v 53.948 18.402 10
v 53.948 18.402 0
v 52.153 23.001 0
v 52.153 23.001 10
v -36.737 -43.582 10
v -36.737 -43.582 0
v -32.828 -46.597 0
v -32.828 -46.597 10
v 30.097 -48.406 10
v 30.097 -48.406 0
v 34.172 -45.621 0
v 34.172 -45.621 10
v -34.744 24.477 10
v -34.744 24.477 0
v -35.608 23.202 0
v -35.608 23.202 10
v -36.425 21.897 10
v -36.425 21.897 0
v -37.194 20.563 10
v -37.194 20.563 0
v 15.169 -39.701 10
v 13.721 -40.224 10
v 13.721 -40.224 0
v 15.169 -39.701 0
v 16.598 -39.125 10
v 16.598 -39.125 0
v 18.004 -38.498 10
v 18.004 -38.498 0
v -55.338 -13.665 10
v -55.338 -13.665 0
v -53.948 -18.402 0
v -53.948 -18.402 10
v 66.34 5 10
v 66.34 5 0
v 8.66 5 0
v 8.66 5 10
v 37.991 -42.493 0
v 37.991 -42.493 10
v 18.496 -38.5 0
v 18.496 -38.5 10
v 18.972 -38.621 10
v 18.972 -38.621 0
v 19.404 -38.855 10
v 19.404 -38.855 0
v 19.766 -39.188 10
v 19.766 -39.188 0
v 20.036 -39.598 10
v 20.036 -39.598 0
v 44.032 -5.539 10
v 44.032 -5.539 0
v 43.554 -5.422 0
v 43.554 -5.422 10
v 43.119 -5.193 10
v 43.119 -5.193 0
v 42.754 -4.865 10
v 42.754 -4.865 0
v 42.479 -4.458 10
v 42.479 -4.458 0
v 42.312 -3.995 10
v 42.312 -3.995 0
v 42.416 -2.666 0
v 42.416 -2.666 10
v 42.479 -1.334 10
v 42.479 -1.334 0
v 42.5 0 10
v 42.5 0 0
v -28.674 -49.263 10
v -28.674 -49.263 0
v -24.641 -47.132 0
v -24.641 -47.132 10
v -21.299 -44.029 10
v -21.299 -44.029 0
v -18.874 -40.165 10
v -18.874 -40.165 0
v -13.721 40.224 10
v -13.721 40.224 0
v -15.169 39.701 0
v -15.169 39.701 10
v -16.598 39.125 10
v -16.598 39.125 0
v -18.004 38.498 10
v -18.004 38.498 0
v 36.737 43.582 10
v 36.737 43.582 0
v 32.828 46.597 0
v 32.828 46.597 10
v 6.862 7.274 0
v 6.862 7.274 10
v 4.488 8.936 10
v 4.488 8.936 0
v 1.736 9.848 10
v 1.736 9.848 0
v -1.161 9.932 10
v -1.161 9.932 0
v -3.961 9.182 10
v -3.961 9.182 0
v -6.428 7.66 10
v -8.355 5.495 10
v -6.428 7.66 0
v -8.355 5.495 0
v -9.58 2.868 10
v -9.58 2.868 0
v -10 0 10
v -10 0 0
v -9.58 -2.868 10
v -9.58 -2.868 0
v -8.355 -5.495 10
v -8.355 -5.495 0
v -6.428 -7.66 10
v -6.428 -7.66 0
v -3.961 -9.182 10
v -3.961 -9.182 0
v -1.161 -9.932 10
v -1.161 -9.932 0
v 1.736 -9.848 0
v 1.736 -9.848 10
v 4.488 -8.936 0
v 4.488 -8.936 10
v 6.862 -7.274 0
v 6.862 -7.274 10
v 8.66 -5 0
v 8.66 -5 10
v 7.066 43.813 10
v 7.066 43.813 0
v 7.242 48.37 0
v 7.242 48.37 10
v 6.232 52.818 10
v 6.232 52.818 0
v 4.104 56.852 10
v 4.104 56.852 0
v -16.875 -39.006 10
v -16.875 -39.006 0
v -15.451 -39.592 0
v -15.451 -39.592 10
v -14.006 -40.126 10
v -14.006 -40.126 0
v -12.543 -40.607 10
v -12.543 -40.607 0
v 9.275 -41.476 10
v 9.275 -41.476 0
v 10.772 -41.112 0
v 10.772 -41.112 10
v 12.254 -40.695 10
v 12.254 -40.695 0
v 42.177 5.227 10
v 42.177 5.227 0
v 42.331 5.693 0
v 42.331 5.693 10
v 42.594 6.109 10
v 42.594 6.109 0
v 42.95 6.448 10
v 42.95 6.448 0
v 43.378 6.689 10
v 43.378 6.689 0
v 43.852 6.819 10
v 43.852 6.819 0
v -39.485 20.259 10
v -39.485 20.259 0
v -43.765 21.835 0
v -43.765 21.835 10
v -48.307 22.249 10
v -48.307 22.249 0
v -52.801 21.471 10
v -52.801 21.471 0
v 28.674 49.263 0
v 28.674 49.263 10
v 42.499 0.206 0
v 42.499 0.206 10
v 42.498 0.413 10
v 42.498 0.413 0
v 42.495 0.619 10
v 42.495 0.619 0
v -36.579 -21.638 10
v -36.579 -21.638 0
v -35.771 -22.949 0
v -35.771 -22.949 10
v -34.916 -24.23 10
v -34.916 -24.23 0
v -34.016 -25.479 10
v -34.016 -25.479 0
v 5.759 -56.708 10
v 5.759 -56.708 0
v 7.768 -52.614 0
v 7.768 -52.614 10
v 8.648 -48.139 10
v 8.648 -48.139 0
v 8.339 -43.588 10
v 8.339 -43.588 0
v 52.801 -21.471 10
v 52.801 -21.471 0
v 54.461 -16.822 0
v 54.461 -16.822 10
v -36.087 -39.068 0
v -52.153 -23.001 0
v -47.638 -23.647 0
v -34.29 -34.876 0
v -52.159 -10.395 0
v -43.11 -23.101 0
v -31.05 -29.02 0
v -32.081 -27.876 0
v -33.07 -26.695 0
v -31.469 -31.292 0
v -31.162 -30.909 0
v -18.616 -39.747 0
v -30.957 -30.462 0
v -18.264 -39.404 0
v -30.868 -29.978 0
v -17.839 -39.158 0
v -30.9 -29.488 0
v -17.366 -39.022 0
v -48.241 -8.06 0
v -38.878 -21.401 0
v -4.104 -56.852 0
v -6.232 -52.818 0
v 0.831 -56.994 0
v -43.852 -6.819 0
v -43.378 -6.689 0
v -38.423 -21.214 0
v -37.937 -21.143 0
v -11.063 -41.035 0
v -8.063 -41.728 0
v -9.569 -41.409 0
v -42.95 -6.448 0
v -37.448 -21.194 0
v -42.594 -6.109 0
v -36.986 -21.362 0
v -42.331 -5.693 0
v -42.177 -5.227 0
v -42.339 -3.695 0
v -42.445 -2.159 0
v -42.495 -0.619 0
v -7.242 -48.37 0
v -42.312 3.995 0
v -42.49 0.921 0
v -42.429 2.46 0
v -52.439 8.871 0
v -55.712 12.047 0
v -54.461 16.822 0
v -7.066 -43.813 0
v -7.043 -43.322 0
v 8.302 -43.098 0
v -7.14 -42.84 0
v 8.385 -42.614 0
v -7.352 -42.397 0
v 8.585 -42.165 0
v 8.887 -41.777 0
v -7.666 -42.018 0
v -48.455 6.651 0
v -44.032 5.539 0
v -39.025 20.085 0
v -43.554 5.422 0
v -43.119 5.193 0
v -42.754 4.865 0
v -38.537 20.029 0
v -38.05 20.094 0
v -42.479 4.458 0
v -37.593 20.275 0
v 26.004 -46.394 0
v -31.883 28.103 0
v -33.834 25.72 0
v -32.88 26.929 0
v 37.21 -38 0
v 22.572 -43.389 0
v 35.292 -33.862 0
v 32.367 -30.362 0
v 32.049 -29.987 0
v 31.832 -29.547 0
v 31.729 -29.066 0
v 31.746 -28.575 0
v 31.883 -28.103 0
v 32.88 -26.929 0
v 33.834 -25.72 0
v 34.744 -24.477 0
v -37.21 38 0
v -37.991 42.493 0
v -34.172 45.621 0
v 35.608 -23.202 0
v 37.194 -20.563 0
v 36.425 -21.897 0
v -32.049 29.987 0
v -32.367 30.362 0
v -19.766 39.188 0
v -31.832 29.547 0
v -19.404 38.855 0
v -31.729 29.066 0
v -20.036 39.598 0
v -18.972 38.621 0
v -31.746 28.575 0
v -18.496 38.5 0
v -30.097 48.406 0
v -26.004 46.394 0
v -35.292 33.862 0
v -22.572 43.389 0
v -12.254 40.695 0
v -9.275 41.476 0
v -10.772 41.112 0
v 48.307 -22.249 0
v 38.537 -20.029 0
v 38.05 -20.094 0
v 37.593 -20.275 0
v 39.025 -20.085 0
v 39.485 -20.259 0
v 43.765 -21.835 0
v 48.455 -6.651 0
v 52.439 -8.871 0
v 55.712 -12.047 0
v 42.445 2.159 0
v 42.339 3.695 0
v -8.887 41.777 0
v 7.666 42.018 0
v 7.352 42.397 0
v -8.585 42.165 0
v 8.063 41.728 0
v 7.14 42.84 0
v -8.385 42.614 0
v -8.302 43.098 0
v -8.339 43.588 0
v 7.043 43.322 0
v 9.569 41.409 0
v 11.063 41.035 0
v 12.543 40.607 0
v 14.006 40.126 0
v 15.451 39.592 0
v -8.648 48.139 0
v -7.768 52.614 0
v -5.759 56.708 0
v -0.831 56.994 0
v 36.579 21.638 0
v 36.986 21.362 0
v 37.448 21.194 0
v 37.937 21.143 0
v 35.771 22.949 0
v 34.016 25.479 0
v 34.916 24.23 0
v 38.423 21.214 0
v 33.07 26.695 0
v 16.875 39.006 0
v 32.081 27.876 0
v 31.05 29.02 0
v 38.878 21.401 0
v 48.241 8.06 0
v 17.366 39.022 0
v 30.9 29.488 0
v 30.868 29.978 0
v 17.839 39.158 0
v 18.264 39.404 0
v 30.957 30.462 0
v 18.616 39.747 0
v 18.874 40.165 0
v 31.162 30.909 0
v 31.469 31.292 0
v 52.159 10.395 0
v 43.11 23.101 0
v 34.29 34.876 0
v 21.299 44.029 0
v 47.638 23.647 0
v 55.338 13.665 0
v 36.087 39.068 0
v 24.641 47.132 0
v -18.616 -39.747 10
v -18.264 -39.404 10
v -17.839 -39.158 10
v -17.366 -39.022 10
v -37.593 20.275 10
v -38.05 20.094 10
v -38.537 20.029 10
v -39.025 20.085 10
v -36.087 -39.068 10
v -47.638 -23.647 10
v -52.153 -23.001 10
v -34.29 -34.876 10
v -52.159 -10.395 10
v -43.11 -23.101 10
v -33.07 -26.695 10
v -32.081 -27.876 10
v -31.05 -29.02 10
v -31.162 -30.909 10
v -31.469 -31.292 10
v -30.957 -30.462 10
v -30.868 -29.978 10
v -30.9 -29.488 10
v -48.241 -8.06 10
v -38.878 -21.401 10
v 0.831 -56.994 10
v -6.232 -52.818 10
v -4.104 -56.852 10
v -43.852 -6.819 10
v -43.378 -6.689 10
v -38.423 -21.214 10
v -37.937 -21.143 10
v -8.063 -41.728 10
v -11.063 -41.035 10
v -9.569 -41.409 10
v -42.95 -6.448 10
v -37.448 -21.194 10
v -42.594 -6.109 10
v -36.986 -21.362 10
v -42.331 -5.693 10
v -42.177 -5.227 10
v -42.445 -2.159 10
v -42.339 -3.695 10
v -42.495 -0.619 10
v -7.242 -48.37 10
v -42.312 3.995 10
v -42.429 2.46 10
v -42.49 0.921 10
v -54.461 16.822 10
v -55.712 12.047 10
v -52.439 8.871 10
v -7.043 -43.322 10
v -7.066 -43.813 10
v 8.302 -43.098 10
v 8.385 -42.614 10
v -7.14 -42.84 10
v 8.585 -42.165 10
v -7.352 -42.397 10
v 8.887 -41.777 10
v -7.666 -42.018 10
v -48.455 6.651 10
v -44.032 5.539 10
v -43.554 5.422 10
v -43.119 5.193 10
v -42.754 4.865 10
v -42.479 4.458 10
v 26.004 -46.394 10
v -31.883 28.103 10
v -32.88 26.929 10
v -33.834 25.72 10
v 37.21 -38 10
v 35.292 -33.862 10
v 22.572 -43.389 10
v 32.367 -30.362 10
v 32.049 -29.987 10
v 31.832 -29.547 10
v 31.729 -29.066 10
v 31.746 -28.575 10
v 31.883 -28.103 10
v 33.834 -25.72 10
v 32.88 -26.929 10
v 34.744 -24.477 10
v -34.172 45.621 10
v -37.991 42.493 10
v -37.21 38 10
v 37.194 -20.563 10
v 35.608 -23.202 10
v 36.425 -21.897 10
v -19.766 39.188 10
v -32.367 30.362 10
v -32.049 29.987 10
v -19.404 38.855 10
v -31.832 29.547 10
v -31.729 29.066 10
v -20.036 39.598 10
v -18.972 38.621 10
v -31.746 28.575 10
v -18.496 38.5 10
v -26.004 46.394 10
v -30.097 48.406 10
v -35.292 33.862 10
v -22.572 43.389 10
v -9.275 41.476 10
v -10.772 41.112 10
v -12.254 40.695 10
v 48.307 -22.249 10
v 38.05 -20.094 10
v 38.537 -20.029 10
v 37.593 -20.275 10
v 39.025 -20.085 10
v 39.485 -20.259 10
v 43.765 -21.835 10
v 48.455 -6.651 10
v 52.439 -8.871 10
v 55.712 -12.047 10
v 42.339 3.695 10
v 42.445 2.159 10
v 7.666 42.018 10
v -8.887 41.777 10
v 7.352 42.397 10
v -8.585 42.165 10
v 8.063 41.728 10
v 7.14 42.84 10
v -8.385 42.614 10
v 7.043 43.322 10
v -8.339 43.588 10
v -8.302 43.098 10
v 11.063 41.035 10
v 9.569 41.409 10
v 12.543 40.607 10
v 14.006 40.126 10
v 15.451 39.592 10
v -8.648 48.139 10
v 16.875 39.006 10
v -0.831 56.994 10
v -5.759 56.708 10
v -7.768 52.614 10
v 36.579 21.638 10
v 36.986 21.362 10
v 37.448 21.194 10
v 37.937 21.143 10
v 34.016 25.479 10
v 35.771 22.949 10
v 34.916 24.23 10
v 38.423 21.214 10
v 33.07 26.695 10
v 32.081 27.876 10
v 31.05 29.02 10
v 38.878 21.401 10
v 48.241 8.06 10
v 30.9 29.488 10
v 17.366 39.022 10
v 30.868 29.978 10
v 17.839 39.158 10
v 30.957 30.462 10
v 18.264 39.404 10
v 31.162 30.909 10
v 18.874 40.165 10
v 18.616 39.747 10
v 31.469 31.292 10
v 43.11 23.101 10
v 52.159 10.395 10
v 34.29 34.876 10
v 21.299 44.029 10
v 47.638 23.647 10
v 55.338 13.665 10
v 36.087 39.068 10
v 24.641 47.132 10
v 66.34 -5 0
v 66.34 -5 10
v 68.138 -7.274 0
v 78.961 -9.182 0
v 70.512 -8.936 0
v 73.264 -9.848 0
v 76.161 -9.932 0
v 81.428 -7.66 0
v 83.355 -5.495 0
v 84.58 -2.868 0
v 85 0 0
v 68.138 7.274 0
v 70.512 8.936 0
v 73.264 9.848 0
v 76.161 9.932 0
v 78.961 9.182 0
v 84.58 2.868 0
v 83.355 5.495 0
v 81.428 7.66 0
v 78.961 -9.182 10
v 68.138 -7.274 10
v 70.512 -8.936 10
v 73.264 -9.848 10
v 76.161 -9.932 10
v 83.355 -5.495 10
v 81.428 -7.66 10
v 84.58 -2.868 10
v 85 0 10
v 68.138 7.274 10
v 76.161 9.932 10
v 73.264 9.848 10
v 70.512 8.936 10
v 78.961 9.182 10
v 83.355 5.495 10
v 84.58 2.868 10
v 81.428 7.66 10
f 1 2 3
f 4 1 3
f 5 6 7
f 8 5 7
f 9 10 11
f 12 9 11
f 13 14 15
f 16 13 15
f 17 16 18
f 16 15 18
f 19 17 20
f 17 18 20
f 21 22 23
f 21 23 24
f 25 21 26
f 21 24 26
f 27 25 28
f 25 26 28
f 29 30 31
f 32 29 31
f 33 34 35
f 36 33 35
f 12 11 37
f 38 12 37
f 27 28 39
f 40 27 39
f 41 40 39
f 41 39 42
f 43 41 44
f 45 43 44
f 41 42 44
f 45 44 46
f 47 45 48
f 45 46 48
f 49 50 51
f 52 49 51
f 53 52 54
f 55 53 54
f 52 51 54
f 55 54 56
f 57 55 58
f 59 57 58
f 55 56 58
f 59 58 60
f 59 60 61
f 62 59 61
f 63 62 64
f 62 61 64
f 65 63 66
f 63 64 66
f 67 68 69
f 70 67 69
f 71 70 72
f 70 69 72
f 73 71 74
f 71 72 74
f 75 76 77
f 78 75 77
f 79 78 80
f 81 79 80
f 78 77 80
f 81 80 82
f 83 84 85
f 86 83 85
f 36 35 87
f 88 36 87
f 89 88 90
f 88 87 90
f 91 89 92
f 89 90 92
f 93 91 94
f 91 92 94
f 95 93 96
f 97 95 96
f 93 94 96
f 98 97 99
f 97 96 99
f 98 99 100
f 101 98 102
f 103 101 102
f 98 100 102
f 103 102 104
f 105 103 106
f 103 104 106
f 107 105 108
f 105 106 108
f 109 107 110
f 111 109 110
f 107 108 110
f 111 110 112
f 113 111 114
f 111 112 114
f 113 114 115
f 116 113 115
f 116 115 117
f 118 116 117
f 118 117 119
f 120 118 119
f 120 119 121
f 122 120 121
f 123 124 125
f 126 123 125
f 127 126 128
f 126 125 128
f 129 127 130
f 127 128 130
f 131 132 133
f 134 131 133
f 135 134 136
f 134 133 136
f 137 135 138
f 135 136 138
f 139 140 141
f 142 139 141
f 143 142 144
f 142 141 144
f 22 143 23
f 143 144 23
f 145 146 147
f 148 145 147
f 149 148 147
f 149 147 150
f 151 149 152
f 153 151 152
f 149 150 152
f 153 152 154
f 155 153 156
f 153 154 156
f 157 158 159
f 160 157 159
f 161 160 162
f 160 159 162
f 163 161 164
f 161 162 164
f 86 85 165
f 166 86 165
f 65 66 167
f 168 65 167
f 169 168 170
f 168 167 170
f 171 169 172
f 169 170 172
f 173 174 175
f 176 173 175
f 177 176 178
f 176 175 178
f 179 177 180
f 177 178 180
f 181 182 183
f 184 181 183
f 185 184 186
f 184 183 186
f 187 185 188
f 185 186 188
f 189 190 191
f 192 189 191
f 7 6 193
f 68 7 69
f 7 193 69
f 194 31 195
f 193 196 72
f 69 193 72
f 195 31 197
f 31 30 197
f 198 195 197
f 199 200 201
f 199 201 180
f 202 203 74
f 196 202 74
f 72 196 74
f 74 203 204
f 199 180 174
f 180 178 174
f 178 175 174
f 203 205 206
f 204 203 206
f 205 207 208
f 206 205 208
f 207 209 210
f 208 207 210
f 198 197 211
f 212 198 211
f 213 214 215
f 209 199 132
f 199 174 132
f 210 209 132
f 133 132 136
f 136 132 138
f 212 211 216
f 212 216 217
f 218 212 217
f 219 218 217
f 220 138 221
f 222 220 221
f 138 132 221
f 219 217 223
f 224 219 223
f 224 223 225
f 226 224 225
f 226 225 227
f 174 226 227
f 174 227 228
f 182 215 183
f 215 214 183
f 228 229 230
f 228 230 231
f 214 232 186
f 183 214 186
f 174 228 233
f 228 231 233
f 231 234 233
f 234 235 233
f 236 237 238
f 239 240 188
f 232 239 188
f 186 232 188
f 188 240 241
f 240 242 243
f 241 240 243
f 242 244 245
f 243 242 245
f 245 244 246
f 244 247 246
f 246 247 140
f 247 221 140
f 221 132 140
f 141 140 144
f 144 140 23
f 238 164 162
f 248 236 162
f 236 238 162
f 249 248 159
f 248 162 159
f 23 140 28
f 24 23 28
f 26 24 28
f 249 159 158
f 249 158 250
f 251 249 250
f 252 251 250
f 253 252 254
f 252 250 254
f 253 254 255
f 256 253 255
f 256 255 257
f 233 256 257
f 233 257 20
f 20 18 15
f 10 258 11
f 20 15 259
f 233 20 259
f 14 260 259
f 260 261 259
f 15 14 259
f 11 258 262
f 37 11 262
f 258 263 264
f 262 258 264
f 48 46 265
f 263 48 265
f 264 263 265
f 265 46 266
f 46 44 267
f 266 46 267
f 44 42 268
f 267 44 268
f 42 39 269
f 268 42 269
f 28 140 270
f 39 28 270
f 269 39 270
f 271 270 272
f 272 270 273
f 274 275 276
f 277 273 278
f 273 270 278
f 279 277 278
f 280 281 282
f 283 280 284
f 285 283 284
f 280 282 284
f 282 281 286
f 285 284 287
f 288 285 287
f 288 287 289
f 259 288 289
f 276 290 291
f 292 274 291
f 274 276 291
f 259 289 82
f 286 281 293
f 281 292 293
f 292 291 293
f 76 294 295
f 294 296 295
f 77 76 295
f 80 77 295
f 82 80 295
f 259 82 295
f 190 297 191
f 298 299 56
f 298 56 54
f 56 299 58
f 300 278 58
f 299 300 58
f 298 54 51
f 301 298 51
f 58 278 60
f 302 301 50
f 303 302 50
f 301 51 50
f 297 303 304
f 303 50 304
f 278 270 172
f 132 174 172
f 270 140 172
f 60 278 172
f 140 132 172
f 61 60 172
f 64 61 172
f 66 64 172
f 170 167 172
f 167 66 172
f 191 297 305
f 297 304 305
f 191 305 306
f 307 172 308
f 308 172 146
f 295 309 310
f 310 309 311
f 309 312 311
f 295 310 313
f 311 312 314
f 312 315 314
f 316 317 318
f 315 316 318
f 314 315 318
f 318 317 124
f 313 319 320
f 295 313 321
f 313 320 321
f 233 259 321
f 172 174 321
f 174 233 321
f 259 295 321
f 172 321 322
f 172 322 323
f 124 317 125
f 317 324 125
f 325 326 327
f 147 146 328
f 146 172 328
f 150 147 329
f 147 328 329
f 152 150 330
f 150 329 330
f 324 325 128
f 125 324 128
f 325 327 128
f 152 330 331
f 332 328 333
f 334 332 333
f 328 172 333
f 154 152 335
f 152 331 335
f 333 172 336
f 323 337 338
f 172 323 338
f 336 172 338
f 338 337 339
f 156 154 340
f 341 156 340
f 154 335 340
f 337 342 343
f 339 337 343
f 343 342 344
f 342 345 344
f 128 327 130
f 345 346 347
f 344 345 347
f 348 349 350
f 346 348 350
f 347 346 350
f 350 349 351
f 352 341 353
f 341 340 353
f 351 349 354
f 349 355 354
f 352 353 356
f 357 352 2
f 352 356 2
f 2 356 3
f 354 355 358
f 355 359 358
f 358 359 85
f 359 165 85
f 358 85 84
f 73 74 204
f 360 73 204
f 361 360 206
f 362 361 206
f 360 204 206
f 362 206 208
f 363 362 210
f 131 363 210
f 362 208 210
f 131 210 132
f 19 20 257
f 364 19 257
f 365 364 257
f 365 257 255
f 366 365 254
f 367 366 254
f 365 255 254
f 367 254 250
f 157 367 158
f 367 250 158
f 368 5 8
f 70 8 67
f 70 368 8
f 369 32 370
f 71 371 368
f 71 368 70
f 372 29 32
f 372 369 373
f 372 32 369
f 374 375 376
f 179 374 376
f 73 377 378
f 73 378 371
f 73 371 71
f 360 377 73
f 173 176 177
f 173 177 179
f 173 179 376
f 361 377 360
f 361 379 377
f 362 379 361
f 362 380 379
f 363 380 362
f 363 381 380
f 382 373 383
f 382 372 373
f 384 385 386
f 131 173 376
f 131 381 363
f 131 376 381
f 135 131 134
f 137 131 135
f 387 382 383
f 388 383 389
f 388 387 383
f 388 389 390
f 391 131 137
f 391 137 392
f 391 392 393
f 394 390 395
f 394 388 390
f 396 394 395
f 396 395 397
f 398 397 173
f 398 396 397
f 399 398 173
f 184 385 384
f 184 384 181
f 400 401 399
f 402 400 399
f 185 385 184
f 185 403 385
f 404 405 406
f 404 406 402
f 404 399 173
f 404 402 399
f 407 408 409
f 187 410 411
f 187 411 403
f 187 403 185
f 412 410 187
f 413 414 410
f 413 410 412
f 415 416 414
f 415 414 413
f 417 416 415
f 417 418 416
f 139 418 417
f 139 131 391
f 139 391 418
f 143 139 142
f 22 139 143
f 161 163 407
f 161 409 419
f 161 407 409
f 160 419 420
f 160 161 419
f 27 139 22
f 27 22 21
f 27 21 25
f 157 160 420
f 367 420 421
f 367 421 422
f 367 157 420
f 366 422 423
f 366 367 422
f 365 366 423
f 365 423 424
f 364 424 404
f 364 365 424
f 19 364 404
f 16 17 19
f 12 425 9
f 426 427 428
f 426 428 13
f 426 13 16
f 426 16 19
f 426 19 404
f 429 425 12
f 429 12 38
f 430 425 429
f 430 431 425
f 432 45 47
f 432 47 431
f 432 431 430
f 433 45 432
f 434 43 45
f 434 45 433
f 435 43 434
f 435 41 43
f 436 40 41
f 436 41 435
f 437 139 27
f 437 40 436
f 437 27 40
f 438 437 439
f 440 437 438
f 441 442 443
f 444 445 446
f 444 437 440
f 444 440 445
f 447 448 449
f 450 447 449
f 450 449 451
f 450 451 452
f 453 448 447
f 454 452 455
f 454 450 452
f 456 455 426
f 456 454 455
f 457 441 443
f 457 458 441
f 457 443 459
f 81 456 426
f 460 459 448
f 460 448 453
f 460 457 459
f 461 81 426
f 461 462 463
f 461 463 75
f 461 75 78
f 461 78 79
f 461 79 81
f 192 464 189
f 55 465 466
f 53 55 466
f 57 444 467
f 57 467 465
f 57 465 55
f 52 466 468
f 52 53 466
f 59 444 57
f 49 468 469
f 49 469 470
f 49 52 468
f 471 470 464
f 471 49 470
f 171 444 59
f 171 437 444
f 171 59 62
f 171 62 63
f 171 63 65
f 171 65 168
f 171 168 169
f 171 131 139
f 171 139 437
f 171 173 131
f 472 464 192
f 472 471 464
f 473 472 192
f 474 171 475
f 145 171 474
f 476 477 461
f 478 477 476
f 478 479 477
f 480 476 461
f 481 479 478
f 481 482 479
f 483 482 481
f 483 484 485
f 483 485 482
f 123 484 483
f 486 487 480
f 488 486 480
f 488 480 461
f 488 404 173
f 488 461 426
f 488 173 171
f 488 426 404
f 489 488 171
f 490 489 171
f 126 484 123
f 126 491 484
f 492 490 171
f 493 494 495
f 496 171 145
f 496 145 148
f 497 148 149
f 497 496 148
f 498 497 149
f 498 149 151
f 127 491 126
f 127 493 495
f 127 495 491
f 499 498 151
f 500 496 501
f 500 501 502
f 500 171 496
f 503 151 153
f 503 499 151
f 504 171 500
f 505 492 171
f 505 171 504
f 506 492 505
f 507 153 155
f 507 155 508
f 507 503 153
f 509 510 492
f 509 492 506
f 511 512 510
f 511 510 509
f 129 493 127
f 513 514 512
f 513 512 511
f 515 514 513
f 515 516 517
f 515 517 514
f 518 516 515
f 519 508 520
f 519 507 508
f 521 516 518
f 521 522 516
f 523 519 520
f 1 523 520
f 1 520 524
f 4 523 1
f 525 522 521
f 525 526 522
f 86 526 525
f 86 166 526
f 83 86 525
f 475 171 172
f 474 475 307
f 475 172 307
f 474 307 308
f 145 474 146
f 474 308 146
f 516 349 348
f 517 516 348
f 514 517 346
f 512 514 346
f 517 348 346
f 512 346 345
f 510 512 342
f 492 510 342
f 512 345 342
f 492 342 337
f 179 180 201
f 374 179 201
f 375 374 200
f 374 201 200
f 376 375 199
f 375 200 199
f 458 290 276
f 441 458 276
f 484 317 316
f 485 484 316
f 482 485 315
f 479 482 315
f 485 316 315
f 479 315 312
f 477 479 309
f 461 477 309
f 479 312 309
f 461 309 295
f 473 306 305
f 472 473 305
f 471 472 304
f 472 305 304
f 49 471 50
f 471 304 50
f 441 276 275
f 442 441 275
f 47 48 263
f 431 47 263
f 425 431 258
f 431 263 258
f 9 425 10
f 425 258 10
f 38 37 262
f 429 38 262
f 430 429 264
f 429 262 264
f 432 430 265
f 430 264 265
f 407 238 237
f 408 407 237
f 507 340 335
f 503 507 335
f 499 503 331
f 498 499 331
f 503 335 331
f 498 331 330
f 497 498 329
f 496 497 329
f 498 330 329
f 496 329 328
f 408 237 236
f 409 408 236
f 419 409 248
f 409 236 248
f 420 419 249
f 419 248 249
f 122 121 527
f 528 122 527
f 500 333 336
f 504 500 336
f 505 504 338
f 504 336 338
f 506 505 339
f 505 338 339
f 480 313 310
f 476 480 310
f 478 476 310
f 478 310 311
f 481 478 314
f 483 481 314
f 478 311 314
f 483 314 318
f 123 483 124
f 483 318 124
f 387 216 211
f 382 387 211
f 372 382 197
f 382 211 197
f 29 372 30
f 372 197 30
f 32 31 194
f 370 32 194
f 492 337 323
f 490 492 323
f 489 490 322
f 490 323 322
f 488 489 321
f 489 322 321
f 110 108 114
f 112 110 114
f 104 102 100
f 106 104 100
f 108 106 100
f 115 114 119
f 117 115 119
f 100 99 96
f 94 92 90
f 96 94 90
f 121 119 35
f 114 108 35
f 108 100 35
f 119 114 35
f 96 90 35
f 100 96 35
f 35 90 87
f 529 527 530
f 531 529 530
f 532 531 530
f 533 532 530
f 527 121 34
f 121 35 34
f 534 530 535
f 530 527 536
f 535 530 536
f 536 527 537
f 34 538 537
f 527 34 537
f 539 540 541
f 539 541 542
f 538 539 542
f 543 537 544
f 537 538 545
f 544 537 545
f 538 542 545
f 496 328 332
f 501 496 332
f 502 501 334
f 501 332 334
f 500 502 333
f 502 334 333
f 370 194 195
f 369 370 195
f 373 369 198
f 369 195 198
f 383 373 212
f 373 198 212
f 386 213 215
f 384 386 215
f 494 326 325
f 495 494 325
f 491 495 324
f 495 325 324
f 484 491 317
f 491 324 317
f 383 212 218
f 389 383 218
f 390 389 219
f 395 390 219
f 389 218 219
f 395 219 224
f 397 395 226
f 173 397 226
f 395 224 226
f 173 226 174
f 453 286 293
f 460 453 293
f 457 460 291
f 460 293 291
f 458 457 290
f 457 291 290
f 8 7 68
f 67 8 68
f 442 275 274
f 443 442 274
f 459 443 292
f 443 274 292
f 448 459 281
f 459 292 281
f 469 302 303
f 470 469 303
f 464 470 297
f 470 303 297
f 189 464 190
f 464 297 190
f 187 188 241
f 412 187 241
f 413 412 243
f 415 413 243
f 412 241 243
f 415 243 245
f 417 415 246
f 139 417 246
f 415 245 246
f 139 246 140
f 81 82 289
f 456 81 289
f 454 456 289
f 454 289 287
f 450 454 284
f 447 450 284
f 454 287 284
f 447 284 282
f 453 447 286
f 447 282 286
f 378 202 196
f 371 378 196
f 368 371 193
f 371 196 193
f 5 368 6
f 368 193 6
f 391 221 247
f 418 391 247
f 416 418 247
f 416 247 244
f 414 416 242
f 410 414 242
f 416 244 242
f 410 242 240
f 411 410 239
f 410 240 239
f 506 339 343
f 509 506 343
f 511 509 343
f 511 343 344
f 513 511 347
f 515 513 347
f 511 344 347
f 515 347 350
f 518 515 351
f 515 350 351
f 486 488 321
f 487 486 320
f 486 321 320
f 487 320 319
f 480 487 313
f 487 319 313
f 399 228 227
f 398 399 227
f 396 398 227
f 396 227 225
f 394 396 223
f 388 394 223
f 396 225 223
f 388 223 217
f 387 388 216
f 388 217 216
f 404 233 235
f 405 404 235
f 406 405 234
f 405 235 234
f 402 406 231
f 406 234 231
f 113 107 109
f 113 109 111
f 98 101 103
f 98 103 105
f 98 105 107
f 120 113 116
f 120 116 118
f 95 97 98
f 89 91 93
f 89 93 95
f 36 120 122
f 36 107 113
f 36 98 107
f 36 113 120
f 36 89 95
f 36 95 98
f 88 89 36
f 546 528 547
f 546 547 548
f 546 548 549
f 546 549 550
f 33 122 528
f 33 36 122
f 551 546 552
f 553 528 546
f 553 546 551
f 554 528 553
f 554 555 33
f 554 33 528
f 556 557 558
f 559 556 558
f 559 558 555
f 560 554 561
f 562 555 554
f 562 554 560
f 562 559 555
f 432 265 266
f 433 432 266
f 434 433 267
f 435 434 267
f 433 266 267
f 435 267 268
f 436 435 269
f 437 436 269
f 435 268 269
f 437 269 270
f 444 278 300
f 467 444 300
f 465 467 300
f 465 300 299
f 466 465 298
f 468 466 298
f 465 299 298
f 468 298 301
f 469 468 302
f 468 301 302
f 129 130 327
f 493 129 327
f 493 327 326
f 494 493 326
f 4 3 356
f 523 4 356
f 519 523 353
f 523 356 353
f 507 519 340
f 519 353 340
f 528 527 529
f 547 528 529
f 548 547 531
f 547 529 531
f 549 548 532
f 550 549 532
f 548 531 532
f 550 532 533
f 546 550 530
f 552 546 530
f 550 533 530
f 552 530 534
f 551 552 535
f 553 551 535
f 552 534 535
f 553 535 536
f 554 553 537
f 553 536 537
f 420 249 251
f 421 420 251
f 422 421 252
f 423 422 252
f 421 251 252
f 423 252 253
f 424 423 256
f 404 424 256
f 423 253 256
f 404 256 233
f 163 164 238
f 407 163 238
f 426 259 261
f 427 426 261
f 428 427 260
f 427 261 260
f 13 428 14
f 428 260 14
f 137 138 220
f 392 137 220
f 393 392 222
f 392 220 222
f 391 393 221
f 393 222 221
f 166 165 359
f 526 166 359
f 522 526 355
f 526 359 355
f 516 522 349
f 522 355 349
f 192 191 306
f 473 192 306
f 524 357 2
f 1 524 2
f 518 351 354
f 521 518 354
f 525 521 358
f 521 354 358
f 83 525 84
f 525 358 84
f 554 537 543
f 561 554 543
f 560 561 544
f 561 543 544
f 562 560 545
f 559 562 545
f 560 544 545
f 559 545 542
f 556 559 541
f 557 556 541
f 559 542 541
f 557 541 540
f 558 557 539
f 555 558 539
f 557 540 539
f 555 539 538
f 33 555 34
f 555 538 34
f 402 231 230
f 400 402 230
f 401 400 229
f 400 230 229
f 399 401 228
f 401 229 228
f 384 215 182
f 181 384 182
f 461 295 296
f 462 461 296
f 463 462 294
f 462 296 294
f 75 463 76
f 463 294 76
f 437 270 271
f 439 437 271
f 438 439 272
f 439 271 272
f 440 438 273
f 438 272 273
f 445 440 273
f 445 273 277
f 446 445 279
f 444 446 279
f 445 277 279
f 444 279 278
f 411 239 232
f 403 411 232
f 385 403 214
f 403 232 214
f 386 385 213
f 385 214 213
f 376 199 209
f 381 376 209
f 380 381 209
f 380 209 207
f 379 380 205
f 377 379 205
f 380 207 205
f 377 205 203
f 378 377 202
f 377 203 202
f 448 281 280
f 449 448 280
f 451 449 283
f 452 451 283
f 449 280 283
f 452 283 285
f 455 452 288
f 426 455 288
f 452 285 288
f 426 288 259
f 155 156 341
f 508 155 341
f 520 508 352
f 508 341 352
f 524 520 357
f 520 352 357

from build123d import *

# Parameters (mm, degrees)
F4_DEPTH = 10
F7_DEPTH = 10
F8_COUNT = 10


# Not quite as in the source:
# - a feature names something its author has since deleted; it is built from what else it names


with BuildPart() as f4:
    # F3 (on Top) → F4 (new body)
    with BuildSketch(Plane.XY):
        with BuildLine():
            Line((0, 5), (8.6602540378, 5))
            ThreePointArc((8.6602540378, 5), (-10, 0), (8.6602540378, -5))
            Line((8.6602540378, -5), (0, -5))
            Line((0, -5), (0, 5))
        make_face()
        with BuildLine():
            ThreePointArc((8.6602540378, 5), (9.6592582629, 2.588190451), (10, 0))
            ThreePointArc((10, 0), (9.6592582629, -2.588190451), (8.6602540378, -5))
            Line((8.6602540378, -5), (66.3397459622, -5))
            ThreePointArc((66.3397459622, -5), (65, 0), (66.3397459622, 5))
            Line((66.3397459622, 5), (8.6602540378, 5))
        make_face()
        with BuildLine():
            ThreePointArc((85, 0), (77.588190451, 9.6592582629), (66.3397459622, 5))
            Line((66.3397459622, 5), (75, 5))
            Line((75, 5), (75, -5))
            Line((75, -5), (66.3397459622, -5))
            ThreePointArc((66.3397459622, -5), (77.588190451, -9.6592582629), (85, 0))
        make_face()
        with BuildLine():
            Line((75, 5), (66.3397459622, 5))
            ThreePointArc((66.3397459622, 5), (65, 0), (66.3397459622, -5))
            Line((66.3397459622, -5), (75, -5))
            Line((75, -5), (75, 5))
        make_face()
        with BuildLine():
            ThreePointArc((8.6602540378, -5), (9.6592582629, -2.588190451), (10, 0))
            ThreePointArc((10, 0), (9.6592582629, 2.588190451), (8.6602540378, 5))
            Line((8.6602540378, 5), (0, 5))
            Line((0, 5), (0, -5))
            Line((0, -5), (8.6602540378, -5))
        make_face()
    extrude(amount=F4_DEPTH)


with BuildPart() as f7:
    # F5 (on Top) → F7 (new body)
    with BuildSketch(Plane.XY):
        with BuildLine():
            ThreePointArc((-13.7207679114, 40.2242529815), (-24.7297125313, -34.5643069961), (42.5, 0))
            ThreePointArc((42.5, 0), (34.2003125005, 25.2307079739), (12.5428882416, 40.6069692855))
            Line((12.5428882416, 40.6069692855), (8.5840838738, 41.526906744))
            ThreePointArc((8.5840838738, 41.526906744), (8.3163788428, 41.6092495204), (8.0628019611, 41.7281826172))
            ThreePointArc((8.0628019611, 41.7281826172), (-0.6192479887, 42.4954883715), (-9.2752537824, 41.4755309462))
            ThreePointArc((-9.2752537824, 41.4755309462), (-9.5252575239, 41.3492596284), (-9.7904495841, 41.2591514287))
            Line((-9.7904495841, 41.2591514287), (-13.7207679114, 40.2242529815))
        make_face()
        with BuildLine():
            Line((8.5840838738, 41.526906744), (12.5428882416, 40.6069692855))
            ThreePointArc((12.5428882416, 40.6069692855), (10.3180859183, 41.2284744198), (8.0628019611, 41.7281826172))
            ThreePointArc((8.0628019611, 41.7281826172), (8.3163788428, 41.6092495204), (8.5840838738, 41.526906744))
        make_face()
        with BuildLine():
            ThreePointArc((-9.2752537824, 41.4755309462), (-11.5150196514, 40.910320488), (-13.7207679114, 40.2242529815))
            Line((-13.7207679114, 40.2242529815), (-9.7904495841, 41.2591514287))
            ThreePointArc((-9.7904495841, 41.2591514287), (-9.5252575239, 41.3492596284), (-9.2752537824, 41.4755309462))
        make_face()
        with BuildLine():
            ThreePointArc((-9.2752537824, 41.4755309462), (-0.6192479887, 42.4954883715), (8.0628019611, 41.7281826172))
            ThreePointArc((8.0628019611, 41.7281826172), (7.2325873296, 42.6119250894), (7.0655284339, 43.8129031978))
            ThreePointArc((7.0655284339, 43.8129031978), (6.8828970608, 50.6273818317), (4.1037621109, 56.8520811979))
            Line((4.1037621109, 56.8520811979), (-0.8305208318, 56.99394911))
            Line((-0.8305208318, 56.99394911), (-5.758574926, 56.7083663565))
            ThreePointArc((-5.758574926, 56.7083663565), (-8.3551546341, 50.4053316041), (-8.3391482628, 43.5884248961))
            ThreePointArc((-8.3391482628, 43.5884248961), (-8.471142139, 42.3830889644), (-9.2752537824, 41.4755309462))
        make_face()
    extrude(amount=F7_DEPTH)

    # F8: F7 ×10 about axis
    f8_axis = Axis((0, 0, -2.4173539132), (0, 0, 1))


with BuildPart() as f7_1:
    add(f7.part)
    for i in range(1, F8_COUNT):
        add(f7.part.rotate(f8_axis, i * 360 / F8_COUNT))


solid = Compound([f4.part, f7_1.part])
